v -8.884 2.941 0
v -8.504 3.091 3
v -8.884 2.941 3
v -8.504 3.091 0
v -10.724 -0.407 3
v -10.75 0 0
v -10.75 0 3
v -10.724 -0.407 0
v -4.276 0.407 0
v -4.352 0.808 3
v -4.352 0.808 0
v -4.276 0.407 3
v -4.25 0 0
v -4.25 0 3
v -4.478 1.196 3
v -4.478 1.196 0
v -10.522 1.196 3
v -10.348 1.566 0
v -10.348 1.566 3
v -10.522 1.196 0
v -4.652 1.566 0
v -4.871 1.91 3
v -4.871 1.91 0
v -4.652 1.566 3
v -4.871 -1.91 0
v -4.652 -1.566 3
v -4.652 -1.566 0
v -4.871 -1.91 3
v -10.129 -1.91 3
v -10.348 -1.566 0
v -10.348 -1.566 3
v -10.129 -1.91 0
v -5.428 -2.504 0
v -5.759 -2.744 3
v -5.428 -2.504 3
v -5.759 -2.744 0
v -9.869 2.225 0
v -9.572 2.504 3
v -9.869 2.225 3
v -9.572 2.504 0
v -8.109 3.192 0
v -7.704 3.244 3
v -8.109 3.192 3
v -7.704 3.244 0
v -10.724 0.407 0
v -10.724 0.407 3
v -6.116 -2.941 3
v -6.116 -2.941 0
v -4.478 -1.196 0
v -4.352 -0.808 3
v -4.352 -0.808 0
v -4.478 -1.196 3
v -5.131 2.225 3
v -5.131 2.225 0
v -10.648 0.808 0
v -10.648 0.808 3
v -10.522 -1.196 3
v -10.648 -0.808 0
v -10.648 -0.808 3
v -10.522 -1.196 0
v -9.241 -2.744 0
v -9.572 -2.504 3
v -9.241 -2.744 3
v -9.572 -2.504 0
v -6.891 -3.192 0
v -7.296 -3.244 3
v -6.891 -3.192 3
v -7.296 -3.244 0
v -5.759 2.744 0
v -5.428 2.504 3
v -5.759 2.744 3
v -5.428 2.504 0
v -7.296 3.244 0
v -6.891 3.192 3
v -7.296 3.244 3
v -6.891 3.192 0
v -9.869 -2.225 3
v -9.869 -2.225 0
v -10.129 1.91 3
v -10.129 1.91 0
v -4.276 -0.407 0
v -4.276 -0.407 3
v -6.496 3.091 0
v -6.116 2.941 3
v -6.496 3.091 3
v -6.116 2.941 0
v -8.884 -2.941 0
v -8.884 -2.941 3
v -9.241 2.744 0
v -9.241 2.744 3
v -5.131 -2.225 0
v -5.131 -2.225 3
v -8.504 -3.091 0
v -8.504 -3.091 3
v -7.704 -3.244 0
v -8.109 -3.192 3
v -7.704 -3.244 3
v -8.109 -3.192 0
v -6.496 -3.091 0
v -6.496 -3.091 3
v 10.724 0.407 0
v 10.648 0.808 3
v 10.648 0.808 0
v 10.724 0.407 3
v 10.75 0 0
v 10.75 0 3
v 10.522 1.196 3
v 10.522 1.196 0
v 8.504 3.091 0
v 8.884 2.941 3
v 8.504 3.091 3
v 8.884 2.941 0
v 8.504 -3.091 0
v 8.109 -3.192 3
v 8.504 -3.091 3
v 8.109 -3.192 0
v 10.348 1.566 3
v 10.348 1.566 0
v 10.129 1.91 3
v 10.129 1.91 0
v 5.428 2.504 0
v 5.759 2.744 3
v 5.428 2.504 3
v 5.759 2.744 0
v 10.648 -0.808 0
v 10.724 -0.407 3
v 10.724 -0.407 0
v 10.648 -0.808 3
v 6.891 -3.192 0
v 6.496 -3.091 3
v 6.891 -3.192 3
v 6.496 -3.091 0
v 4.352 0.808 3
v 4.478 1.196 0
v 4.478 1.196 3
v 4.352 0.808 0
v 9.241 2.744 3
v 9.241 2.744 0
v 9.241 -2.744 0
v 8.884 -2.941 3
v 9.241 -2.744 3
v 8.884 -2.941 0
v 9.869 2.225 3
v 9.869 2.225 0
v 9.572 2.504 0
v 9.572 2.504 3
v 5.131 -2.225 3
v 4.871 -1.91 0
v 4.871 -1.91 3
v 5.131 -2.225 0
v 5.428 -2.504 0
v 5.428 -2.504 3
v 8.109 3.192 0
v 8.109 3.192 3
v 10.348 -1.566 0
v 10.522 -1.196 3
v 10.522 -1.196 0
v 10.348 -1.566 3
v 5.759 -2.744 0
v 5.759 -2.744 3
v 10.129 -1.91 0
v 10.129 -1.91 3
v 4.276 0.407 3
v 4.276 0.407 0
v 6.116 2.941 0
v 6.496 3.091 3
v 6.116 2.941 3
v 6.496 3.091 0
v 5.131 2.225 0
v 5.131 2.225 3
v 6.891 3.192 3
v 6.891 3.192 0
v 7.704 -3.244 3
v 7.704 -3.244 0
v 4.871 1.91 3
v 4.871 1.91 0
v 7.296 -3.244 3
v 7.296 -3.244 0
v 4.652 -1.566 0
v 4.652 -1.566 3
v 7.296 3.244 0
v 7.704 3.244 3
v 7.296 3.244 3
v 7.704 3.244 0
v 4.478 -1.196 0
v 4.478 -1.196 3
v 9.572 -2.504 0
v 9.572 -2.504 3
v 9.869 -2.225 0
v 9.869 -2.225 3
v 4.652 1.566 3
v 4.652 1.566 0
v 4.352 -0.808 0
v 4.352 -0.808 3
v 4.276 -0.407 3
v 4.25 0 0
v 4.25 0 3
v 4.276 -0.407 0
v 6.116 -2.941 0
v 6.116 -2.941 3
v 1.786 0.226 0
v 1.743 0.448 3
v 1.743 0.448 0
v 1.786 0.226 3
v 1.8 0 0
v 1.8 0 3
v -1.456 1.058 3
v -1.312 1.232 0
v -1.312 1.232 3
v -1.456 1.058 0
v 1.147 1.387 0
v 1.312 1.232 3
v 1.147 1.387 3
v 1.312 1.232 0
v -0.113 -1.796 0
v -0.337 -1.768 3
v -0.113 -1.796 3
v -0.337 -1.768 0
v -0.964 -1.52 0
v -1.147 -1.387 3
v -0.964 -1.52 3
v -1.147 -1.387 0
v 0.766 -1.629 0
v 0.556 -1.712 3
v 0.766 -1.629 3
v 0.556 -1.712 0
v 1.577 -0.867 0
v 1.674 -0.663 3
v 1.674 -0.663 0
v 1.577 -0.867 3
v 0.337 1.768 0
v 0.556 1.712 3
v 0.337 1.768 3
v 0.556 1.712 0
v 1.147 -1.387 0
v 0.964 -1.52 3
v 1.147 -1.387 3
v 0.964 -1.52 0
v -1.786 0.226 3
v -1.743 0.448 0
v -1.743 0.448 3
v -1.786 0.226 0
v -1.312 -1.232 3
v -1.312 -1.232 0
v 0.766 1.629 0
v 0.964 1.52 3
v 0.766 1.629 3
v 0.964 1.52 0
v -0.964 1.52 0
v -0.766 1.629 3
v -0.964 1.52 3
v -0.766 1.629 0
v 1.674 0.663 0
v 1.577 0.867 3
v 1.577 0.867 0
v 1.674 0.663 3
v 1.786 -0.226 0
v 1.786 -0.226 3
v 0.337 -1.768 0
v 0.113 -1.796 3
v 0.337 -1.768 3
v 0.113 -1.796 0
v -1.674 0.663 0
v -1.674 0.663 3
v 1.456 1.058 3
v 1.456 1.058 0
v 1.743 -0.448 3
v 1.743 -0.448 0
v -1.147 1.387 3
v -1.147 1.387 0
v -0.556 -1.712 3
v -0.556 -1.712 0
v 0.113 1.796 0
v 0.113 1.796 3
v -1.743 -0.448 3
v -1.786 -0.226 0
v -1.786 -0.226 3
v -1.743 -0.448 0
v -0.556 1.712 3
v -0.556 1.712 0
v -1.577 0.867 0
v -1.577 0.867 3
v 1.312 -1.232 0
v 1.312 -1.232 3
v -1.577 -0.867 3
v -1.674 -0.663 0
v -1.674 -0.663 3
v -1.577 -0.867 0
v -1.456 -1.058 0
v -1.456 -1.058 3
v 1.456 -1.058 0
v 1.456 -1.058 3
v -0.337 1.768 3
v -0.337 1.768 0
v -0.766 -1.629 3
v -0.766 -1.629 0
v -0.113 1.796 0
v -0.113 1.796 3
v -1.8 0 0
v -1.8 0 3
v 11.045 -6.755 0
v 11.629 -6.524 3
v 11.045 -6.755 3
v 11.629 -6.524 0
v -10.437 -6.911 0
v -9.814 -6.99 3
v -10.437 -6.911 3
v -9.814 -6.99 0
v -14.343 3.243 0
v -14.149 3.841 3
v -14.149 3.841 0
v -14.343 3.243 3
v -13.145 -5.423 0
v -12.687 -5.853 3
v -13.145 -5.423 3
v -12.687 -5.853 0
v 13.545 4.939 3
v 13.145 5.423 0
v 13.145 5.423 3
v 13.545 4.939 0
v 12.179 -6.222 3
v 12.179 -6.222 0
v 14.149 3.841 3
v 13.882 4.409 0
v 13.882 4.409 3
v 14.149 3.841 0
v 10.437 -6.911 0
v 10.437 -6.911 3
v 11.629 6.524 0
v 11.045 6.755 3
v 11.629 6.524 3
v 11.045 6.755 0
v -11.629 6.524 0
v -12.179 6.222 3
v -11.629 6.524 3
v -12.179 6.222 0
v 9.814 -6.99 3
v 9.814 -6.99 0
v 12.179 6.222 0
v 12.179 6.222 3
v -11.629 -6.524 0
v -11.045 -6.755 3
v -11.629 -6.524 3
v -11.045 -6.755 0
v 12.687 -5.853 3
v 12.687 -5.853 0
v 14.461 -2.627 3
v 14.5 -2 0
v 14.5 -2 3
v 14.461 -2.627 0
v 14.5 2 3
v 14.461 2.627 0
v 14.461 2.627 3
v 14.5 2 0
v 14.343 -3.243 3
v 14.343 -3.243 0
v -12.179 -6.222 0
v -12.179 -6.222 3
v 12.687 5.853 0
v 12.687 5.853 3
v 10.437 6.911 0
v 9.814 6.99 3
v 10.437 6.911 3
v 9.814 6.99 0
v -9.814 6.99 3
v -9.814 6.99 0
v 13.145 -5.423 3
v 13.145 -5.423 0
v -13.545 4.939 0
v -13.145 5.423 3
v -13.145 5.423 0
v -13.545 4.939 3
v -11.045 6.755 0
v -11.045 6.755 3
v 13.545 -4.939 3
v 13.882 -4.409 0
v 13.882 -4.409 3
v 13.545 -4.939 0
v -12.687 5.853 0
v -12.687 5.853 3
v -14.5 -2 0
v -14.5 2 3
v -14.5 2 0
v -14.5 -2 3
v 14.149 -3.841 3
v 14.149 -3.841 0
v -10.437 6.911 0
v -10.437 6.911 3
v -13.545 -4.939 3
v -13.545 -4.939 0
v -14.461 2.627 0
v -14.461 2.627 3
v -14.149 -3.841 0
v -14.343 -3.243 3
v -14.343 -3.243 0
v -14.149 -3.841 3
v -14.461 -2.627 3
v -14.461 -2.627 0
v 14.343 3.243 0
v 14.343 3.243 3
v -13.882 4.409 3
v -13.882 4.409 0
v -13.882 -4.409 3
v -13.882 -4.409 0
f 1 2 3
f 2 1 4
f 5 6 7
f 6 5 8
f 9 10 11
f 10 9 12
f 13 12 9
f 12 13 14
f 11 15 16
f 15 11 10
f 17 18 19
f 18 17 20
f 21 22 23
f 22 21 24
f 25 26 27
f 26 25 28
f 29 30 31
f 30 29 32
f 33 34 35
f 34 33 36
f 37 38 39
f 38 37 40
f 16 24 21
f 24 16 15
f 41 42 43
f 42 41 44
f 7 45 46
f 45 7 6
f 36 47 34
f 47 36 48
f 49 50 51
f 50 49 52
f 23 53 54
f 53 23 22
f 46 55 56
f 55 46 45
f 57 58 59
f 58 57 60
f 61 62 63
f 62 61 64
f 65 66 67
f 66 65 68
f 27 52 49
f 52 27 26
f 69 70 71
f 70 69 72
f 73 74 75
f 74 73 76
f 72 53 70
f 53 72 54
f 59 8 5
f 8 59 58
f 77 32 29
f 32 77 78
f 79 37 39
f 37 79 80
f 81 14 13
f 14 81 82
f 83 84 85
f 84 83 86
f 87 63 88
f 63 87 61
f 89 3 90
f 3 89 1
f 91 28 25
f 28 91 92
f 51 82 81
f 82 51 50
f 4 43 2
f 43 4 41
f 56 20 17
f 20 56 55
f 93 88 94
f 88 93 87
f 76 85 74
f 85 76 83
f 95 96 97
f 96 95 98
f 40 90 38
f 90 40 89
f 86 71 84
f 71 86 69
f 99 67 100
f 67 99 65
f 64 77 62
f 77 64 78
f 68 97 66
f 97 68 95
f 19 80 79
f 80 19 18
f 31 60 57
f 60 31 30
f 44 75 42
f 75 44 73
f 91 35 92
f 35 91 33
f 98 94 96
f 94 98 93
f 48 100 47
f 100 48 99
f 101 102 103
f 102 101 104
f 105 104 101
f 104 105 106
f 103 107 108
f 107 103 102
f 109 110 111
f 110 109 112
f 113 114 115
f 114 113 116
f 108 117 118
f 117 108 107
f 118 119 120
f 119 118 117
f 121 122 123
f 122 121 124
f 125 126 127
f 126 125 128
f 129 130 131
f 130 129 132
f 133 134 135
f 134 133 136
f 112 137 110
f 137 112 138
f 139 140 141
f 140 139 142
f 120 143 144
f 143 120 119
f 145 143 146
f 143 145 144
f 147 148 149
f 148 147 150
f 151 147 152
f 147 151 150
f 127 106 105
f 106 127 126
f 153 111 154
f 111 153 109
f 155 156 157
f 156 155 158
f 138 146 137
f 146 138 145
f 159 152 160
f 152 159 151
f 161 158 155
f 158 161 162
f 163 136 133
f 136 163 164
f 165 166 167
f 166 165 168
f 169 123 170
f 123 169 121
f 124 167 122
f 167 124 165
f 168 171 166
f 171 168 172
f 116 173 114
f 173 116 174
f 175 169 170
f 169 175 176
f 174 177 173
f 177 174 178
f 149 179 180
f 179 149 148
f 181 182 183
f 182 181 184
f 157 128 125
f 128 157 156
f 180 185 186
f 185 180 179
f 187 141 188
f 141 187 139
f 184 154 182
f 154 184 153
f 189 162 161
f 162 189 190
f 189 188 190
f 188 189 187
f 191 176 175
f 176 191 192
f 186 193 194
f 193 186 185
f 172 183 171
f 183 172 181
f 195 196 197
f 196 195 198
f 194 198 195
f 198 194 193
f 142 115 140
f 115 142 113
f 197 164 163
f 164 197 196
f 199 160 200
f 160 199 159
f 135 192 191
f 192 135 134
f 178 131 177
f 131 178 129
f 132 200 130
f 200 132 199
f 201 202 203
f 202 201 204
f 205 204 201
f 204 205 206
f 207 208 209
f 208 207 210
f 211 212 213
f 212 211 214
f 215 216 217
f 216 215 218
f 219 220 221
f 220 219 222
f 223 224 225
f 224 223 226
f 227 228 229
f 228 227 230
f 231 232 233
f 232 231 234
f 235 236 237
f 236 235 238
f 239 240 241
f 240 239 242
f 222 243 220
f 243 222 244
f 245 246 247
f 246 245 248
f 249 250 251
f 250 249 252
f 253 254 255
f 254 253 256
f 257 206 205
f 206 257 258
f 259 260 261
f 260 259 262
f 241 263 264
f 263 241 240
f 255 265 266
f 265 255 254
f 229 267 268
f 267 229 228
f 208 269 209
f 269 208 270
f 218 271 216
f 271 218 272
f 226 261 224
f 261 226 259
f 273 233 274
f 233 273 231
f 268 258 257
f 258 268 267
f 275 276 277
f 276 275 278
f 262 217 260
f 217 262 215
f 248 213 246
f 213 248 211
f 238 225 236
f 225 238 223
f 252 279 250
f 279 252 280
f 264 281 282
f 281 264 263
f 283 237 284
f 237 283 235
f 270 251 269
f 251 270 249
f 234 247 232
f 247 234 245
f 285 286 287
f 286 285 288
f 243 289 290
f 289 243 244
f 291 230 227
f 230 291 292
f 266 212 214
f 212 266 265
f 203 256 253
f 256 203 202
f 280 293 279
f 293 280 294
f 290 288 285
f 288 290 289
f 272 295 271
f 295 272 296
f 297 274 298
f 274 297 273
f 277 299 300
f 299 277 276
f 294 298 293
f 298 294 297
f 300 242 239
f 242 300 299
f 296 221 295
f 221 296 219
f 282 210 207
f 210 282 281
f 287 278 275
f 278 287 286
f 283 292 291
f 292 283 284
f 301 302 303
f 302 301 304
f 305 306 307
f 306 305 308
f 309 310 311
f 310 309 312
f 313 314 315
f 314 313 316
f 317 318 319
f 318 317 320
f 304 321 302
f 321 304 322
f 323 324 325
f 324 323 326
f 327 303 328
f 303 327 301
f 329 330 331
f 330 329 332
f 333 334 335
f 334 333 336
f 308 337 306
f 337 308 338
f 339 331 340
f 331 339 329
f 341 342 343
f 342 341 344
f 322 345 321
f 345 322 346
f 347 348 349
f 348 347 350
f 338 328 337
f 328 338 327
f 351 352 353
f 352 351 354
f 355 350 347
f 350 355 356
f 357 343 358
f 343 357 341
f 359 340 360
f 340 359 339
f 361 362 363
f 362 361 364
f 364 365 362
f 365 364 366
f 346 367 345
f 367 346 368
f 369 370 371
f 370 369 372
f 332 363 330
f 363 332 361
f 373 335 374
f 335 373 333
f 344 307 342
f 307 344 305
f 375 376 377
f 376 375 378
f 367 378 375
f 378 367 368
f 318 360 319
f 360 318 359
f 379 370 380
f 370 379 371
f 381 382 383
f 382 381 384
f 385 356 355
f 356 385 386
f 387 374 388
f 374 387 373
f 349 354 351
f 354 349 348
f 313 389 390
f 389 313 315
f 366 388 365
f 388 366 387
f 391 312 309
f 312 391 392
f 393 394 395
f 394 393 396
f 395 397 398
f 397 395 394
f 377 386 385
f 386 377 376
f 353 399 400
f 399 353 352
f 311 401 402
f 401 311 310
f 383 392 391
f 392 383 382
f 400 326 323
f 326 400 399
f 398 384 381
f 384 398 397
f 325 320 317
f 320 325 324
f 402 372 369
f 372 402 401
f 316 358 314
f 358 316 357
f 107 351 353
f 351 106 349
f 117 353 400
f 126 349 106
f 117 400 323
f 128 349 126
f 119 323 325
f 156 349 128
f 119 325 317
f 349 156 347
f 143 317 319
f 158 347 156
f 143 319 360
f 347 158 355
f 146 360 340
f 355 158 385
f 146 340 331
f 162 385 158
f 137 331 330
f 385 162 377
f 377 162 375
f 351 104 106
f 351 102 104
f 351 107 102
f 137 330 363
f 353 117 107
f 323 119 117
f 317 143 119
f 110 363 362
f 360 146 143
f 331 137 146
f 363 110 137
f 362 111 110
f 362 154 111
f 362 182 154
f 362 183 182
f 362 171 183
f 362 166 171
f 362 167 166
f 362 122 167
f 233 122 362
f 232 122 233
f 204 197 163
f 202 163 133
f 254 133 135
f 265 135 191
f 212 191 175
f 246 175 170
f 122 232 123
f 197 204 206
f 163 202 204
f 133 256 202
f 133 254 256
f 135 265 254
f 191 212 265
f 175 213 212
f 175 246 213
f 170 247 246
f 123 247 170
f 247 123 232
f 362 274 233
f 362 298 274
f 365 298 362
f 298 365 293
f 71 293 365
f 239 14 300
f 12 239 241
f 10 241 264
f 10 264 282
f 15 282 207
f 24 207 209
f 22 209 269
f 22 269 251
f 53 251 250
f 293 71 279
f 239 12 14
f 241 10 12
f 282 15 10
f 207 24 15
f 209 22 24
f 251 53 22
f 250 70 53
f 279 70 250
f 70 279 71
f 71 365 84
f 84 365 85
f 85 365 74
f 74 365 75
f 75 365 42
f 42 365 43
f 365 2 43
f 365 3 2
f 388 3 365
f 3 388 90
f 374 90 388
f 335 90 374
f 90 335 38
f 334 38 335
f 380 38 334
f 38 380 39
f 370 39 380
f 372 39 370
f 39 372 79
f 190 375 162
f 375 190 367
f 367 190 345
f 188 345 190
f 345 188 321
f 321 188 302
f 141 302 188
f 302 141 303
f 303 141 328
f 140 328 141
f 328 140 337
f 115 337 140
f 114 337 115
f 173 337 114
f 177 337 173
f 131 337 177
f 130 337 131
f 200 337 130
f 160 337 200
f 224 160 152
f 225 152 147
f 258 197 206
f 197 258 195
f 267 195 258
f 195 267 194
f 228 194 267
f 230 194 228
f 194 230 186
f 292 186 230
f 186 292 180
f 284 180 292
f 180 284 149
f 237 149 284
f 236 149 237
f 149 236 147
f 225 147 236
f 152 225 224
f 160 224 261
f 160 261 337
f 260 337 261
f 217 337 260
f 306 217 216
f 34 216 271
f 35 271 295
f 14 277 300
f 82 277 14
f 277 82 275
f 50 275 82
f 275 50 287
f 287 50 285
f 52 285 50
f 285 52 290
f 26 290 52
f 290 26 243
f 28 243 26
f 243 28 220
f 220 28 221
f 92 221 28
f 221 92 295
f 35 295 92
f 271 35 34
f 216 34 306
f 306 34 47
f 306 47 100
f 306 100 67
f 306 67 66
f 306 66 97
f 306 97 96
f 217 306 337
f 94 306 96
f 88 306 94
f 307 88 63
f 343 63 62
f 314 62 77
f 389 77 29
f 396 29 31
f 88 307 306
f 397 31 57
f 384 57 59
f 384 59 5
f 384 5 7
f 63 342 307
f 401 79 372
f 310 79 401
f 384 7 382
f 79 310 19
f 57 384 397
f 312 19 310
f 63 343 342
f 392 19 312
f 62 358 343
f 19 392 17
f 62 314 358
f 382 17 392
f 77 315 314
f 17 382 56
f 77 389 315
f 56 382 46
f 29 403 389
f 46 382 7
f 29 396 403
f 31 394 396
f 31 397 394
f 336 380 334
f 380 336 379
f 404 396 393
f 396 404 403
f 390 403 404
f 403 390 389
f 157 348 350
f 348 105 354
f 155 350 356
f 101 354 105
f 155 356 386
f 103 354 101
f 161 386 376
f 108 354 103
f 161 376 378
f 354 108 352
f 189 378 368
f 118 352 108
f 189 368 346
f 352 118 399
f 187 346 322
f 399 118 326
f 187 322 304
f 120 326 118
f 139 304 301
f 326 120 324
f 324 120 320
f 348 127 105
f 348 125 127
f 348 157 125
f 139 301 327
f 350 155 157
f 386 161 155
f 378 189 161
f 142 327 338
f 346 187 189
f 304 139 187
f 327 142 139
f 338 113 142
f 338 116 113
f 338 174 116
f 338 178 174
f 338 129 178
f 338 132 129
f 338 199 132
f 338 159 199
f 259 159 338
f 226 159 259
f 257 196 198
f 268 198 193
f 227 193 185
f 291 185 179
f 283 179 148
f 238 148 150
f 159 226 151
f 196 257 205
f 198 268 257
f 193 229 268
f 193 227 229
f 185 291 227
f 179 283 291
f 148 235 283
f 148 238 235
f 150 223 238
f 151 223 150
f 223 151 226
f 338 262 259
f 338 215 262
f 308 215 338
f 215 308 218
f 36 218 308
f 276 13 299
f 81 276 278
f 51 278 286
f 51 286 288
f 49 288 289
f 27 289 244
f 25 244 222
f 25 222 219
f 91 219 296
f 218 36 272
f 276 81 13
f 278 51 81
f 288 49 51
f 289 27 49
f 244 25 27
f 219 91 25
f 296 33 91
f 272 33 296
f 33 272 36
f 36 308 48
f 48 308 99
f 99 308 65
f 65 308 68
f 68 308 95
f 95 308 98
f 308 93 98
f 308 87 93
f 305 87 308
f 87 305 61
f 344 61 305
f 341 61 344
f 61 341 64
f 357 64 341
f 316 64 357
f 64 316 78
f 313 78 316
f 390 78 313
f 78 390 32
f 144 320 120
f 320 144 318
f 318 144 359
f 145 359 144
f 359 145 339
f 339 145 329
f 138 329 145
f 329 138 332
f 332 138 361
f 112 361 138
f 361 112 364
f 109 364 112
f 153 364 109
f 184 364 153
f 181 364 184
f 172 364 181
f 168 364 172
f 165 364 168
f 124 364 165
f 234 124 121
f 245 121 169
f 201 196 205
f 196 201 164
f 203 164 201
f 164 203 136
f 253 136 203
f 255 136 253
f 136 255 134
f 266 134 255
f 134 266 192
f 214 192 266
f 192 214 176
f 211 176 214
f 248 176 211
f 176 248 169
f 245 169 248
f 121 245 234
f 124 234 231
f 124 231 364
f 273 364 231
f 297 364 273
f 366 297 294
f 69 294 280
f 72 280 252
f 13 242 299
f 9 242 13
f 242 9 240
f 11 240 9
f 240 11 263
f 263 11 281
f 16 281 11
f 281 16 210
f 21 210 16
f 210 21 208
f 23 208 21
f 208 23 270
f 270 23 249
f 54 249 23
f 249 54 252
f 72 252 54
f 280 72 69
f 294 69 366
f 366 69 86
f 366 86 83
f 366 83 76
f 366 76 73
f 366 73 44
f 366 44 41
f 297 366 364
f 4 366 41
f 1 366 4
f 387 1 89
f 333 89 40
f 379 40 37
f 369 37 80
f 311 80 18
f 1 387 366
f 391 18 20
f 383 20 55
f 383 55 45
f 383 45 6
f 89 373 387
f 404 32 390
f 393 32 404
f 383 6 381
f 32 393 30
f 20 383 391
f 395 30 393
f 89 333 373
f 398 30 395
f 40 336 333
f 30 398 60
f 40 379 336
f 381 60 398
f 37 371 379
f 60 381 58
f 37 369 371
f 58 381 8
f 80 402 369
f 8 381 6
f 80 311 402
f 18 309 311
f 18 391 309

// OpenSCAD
$fn = 50;

difference() {
	union() {
		hull() {
			translate(v = [-9.5, 2.0, 0]) {
				cylinder(h = 3, r = 5);
			}
			translate(v = [9.5, 2.0, 0]) {
				cylinder(h = 3, r = 5);
			}
			translate(v = [-9.5, -2.0, 0]) {
				cylinder(h = 3, r = 5);
			}
			translate(v = [9.5, -2.0, 0]) {
				cylinder(h = 3, r = 5);
			}
		}
	}
	union() {
		translate(v = [-7.5, 0.0, 0]) {
			translate(v = [0, 0, -100]) {
				cylinder(h = 200, r = 3.25);
			}
		}
		translate(v = [7.5, 0.0, 0]) {
			translate(v = [0, 0, -100]) {
				cylinder(h = 200, r = 3.25);
			}
		}
		translate(v = [-7.5, 0.0, 0]) {
			translate(v = [0, 0, -100]) {
				cylinder(h = 200, r = 1.8);
			}
		}
		translate(v = [0, 0, -100]) {
			cylinder(h = 200, r = 1.8);
		}
		translate(v = [7.5, 0.0, 0]) {
			translate(v = [0, 0, -100]) {
				cylinder(h = 200, r = 1.8);
			}
		}
	}
}
